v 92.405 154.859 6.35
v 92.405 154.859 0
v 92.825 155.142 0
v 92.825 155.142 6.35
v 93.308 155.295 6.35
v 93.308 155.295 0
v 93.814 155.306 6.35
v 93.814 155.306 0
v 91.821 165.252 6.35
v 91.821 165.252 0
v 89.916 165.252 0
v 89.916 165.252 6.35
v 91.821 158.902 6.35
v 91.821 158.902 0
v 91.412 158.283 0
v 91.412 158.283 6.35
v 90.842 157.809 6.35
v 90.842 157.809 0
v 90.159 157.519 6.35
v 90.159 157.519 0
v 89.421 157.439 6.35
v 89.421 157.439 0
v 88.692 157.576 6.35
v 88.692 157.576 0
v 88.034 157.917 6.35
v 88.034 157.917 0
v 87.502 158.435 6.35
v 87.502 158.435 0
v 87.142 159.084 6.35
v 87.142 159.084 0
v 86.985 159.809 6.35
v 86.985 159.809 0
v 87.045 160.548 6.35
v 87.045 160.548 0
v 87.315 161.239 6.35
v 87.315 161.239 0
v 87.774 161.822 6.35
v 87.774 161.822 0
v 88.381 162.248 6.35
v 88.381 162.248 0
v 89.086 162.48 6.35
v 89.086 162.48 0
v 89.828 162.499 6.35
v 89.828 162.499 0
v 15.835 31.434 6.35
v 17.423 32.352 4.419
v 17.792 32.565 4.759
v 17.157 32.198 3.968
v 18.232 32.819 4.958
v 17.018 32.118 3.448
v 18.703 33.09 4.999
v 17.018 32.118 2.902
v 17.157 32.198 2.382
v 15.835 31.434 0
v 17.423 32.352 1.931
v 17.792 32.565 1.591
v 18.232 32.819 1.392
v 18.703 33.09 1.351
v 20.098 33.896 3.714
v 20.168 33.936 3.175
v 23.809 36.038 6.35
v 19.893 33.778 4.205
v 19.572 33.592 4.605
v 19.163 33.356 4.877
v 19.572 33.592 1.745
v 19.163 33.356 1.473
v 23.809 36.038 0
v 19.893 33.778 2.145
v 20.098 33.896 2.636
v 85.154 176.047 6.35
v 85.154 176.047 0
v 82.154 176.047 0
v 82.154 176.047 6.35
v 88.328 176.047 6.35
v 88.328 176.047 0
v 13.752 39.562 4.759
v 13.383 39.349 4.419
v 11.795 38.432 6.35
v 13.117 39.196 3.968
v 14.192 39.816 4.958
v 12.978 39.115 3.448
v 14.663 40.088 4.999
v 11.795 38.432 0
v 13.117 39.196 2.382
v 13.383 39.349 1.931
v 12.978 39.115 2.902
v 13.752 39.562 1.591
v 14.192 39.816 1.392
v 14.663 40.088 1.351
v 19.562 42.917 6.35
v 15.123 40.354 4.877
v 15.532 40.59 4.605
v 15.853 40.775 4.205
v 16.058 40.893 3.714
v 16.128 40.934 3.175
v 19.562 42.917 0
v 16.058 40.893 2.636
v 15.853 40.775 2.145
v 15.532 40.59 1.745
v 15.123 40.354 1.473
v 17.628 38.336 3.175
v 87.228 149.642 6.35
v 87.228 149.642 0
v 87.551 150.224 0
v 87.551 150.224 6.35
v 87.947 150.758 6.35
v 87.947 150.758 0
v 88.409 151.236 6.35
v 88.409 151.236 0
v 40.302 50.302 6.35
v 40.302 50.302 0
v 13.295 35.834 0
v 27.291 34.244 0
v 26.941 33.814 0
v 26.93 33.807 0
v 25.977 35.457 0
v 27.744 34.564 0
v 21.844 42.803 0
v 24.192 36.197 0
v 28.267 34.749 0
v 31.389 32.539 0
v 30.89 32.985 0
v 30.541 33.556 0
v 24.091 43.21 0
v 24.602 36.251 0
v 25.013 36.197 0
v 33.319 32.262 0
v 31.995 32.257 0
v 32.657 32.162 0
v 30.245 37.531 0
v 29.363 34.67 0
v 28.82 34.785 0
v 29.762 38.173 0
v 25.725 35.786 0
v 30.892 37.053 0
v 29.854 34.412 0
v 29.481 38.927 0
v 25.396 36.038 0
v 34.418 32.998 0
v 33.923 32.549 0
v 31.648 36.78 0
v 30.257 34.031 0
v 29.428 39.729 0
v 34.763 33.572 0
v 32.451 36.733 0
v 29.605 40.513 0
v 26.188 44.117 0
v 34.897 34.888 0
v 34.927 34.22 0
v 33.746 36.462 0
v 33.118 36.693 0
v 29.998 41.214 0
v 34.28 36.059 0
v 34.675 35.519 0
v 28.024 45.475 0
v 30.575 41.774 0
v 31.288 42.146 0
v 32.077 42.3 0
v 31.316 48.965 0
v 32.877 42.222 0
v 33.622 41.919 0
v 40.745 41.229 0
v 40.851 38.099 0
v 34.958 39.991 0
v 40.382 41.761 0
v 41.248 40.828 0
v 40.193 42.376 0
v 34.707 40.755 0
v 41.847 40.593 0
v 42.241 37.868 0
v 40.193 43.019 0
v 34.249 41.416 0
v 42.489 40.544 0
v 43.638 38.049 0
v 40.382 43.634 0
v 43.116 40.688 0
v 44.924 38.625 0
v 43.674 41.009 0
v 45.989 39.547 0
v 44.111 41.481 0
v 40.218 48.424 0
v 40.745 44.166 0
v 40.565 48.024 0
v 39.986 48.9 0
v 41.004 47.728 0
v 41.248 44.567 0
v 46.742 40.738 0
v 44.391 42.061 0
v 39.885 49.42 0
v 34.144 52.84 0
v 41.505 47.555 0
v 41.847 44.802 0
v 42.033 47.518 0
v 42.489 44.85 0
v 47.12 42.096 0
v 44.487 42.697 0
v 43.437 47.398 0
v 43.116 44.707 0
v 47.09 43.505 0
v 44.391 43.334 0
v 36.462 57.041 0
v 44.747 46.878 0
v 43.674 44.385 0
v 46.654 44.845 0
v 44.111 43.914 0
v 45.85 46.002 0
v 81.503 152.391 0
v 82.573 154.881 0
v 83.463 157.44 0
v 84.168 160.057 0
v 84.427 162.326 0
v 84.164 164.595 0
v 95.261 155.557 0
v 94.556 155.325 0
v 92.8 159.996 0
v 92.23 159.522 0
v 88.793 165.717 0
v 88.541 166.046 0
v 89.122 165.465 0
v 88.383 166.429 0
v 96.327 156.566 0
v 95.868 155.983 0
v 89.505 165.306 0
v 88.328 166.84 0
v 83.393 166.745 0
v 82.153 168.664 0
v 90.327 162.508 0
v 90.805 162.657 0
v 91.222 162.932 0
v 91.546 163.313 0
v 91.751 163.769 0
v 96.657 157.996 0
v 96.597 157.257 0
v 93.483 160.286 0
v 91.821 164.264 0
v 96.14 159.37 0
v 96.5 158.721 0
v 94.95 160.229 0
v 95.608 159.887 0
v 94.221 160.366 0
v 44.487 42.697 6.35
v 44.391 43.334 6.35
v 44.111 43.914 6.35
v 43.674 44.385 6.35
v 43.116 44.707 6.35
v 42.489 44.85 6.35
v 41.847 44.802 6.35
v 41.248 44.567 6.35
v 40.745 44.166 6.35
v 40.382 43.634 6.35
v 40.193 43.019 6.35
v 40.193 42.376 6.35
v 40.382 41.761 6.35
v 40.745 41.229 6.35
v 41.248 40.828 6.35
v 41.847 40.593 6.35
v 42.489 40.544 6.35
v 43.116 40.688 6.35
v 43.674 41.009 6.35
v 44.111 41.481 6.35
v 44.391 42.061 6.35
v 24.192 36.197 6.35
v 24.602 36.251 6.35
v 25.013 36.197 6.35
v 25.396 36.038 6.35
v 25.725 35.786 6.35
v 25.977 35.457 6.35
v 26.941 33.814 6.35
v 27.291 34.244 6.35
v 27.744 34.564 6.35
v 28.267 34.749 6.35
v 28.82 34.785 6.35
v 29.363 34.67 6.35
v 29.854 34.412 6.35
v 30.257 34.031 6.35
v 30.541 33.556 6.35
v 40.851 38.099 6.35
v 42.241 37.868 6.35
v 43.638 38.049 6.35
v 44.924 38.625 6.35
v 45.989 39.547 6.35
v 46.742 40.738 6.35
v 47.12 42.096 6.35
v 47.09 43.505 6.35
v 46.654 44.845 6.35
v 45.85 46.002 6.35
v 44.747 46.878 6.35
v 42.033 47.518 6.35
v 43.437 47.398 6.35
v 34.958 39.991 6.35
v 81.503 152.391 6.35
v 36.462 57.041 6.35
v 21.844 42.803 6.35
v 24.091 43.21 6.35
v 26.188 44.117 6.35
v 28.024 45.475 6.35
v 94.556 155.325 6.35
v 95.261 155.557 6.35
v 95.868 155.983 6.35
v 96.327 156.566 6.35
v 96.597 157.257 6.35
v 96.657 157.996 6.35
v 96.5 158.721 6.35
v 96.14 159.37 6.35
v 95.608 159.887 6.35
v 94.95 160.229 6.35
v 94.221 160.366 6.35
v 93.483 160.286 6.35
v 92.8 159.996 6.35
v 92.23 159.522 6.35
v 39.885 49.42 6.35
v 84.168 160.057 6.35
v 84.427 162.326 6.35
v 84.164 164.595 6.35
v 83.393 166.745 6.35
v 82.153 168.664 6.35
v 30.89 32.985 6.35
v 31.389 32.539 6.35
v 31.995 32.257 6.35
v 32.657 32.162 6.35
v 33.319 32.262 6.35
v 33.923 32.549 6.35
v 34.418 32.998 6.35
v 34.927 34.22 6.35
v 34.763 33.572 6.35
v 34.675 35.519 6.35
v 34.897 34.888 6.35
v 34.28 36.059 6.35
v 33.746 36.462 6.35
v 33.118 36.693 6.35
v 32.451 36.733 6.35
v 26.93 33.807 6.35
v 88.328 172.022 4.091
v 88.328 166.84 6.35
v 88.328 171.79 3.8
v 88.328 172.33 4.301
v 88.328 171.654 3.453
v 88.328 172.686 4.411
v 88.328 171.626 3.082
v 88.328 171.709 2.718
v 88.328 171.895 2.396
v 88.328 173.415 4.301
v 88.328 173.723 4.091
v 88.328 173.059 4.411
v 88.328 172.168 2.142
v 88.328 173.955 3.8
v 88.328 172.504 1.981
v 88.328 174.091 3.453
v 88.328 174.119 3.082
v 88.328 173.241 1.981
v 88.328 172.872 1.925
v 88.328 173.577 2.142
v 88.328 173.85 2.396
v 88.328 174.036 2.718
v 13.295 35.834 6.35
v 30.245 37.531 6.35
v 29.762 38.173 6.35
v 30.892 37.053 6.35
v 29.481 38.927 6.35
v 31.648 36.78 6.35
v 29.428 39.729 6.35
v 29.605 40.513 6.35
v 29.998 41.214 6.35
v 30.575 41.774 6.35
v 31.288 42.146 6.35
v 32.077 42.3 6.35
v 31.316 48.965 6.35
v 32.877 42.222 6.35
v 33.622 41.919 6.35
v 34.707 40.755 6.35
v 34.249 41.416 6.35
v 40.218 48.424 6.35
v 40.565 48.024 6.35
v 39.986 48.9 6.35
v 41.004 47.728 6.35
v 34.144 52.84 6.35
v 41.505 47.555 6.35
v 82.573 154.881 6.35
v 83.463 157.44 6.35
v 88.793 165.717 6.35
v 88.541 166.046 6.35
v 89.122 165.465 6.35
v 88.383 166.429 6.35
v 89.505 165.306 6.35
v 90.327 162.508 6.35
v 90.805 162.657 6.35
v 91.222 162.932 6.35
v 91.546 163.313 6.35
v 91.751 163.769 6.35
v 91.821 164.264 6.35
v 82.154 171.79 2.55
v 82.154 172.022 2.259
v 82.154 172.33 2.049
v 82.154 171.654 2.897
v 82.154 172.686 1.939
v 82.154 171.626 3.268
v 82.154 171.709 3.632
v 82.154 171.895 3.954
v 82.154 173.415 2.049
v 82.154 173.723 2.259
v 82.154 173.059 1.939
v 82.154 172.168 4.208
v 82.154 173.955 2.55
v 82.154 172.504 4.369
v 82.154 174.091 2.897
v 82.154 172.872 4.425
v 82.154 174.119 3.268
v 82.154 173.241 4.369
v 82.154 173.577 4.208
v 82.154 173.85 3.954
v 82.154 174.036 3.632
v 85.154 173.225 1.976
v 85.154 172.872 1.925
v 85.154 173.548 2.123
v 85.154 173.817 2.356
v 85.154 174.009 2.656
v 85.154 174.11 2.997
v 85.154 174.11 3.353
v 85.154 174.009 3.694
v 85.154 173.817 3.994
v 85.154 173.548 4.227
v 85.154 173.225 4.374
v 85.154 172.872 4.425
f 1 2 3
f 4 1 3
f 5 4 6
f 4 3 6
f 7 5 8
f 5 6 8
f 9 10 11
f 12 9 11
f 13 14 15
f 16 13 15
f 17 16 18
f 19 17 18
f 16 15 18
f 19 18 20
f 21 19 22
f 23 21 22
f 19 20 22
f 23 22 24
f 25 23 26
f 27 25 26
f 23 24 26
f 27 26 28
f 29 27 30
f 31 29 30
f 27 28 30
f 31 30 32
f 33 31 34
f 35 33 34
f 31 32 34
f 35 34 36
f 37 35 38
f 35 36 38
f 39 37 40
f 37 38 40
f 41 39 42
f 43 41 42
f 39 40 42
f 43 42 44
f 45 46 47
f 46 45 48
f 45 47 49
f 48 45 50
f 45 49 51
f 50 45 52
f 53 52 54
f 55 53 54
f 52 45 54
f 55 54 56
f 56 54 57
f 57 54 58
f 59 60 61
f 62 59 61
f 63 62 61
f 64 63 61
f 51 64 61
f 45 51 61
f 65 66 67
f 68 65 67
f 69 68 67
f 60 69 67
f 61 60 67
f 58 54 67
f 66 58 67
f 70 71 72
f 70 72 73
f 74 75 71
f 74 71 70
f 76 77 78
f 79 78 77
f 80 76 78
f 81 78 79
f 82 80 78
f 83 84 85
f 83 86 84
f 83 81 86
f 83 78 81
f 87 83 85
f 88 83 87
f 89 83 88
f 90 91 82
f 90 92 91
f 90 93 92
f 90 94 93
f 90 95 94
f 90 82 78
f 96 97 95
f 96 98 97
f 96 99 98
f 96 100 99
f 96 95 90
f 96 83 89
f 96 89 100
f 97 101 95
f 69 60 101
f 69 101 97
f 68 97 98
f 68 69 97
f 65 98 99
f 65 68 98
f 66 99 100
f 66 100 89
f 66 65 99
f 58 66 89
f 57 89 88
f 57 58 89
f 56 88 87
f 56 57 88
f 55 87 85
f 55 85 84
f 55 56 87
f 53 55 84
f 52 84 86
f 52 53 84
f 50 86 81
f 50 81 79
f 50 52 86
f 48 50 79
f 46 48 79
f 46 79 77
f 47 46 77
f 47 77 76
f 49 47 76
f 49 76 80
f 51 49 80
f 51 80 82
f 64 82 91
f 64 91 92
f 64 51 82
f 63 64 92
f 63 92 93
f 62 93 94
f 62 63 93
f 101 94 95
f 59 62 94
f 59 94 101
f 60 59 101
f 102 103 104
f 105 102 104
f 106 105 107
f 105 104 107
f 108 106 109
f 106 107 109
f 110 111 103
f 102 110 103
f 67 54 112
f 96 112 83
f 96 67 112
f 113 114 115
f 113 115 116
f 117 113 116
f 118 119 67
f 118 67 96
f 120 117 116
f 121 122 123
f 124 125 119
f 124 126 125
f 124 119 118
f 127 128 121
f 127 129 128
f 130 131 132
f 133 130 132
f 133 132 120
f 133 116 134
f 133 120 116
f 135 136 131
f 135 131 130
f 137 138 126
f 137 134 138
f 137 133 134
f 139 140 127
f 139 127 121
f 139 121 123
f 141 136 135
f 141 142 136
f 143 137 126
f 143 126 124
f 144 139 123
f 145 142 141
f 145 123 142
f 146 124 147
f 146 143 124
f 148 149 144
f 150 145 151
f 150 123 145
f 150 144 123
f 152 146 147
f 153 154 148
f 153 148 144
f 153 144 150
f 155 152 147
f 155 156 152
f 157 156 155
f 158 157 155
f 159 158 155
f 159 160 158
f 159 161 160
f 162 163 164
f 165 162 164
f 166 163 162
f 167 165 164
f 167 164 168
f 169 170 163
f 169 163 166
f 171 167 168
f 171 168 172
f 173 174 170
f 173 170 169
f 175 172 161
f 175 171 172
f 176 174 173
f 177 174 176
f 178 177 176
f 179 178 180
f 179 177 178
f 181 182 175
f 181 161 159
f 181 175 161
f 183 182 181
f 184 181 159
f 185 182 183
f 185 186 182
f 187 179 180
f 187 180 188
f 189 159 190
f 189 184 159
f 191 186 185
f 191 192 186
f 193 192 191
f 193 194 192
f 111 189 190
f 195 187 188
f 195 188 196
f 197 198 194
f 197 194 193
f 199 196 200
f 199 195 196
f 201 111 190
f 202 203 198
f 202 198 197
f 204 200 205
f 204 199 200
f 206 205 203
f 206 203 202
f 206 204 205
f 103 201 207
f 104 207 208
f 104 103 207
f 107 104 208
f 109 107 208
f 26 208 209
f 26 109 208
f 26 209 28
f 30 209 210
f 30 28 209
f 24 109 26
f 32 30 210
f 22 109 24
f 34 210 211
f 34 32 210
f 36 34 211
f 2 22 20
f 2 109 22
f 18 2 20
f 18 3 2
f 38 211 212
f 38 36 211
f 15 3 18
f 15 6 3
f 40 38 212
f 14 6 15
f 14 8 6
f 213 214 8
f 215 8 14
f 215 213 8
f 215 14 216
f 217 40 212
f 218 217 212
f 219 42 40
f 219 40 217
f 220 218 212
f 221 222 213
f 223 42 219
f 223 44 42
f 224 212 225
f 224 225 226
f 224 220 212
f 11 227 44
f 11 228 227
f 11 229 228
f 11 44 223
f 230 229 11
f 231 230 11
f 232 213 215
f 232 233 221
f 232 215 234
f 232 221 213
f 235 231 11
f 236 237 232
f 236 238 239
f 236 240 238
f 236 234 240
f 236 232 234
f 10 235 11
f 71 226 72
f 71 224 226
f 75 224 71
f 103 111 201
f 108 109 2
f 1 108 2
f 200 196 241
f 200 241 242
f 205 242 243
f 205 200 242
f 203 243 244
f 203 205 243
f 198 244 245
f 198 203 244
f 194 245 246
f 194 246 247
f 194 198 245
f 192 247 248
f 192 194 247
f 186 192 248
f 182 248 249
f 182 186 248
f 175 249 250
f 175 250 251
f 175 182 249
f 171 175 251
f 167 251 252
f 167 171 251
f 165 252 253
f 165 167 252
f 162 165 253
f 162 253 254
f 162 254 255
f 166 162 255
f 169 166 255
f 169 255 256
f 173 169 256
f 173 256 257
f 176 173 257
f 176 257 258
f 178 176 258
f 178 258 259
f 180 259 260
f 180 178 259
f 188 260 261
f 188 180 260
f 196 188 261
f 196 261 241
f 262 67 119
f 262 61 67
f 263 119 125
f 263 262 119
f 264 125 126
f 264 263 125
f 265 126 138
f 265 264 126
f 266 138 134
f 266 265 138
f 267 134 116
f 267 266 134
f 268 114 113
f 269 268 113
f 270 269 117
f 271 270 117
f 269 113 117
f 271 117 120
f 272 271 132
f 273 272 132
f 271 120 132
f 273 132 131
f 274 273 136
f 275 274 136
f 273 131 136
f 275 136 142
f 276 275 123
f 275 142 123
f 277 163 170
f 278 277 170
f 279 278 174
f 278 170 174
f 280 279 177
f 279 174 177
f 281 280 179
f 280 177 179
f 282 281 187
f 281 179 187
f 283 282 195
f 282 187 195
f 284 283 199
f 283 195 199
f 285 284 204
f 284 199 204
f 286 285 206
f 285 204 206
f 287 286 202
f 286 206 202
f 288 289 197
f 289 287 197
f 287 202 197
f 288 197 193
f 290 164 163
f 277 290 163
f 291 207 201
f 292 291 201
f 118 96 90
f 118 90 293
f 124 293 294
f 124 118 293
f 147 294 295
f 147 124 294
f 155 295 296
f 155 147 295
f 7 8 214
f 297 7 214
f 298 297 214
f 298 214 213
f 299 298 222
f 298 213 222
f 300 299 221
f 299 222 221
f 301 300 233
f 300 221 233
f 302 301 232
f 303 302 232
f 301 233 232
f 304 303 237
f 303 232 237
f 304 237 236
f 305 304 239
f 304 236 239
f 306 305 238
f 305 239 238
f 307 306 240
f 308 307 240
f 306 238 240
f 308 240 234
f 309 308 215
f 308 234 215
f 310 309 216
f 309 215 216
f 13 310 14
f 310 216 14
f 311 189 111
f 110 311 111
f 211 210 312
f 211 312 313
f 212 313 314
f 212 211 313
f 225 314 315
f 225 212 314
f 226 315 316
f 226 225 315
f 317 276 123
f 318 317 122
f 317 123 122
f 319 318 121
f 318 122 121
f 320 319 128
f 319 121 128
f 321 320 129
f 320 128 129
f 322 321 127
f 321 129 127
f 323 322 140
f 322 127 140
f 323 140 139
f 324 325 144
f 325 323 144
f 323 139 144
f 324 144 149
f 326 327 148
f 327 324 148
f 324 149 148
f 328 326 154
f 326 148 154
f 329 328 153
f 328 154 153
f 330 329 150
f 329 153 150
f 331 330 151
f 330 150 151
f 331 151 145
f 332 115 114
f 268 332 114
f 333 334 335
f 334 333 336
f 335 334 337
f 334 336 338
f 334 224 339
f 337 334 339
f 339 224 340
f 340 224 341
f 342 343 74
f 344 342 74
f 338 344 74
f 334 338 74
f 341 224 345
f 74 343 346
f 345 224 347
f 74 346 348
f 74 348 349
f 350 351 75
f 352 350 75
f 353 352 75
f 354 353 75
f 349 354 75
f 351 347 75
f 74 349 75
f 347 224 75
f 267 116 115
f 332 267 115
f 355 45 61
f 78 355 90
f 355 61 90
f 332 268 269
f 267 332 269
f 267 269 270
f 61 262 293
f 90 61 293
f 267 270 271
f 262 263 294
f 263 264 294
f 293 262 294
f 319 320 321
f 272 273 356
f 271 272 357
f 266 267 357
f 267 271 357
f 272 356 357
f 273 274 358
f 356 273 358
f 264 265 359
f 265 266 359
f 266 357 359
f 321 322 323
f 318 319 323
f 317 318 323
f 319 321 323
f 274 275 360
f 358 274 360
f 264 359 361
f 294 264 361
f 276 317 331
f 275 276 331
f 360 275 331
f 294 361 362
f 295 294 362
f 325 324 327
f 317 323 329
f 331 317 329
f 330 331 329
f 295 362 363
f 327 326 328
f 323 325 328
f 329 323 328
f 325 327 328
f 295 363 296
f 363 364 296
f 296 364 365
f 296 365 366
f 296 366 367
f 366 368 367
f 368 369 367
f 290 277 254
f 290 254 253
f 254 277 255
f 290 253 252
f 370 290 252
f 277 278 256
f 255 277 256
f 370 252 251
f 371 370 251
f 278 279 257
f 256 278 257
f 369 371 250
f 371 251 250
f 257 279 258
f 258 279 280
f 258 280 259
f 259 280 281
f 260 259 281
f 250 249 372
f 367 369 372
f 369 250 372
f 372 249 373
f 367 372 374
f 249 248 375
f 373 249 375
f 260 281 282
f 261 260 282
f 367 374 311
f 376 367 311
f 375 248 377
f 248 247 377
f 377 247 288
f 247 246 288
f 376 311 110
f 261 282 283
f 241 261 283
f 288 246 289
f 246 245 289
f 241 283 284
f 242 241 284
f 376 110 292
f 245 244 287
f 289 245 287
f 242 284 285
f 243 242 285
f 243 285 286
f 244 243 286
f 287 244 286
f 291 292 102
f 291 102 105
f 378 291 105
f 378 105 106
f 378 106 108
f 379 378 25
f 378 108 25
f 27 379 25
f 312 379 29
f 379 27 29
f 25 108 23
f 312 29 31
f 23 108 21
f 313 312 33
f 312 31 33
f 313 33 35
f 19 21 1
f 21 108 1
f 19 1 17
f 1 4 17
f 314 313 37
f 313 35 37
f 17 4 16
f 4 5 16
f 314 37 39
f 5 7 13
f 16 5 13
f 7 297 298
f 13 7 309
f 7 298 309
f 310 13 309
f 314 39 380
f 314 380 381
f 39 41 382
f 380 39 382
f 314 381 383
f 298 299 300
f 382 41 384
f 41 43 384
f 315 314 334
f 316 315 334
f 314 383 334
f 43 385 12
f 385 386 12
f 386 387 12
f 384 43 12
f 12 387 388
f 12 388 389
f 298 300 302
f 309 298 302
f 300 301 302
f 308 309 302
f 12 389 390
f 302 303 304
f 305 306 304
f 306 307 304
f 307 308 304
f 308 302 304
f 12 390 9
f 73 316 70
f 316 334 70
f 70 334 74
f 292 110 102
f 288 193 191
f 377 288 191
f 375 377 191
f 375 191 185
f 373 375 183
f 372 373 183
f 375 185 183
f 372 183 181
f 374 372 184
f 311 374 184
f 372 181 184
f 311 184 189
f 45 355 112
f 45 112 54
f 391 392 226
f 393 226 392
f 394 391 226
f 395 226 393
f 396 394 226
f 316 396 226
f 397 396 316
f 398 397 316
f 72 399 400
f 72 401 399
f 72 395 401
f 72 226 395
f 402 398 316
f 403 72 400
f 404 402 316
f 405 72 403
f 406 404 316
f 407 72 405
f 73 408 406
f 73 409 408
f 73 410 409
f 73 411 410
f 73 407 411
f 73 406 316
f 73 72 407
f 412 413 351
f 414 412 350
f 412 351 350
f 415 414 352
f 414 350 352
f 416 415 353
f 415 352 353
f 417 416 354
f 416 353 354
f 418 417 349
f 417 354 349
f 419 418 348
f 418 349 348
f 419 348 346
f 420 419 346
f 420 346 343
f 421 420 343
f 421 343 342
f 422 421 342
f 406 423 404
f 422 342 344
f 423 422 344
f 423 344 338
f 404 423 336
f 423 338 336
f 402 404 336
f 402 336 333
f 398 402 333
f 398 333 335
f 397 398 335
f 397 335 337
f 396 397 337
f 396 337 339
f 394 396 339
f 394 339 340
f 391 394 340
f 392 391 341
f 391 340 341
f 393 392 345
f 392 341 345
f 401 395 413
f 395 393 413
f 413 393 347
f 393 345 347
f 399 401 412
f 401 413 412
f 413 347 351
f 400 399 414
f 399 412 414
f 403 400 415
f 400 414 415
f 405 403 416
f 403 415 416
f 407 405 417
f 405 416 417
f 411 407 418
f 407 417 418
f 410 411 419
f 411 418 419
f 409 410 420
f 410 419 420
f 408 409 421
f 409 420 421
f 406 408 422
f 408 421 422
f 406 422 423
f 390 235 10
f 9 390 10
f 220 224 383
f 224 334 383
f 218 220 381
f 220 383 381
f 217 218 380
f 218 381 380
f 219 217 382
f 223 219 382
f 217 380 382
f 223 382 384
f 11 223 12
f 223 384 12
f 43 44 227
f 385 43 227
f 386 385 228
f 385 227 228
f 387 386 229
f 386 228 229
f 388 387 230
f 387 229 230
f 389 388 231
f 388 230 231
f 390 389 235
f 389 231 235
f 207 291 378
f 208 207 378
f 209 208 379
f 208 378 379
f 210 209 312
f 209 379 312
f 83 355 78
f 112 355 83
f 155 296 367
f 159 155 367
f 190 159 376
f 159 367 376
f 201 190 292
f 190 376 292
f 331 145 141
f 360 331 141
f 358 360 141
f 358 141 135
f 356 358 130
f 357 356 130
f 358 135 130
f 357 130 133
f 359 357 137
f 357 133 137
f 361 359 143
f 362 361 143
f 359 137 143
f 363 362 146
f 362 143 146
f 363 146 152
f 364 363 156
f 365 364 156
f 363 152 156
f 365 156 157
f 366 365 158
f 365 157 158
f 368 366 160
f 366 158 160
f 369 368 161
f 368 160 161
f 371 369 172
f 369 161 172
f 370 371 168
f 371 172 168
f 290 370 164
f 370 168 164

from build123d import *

# Parameters (mm, degrees)
SKETCH1_R                 = 2.159
BOSS_EXTRUDE1_DEPTH       = 6.35
SKETCH2_R                 = 1.8288
CUT_EXTRUDE1_DEPTH        = 192.647335654
SKETCH3_R                 = 0.635
CUT_EXTRUDE2_DEPTH        = 192.476049021
FILLET1_R                 = 1.5875
FILLET2_R                 = 38.1
M3X0_5_TAPPED_HOLE1_D     = 2.5
M3X0_5_TAPPED_HOLE1_DEPTH = 7.50062
M3X0_5_TAPPED_HOLE1_TIP   = 0.751075774
CORTAR_EXTRUIR1_DEPTH     = 10
CROQUIS8_W                = 8.969129367
CROQUIS8_H                = 6.35
CROQUIS8_R                = 1.8288
SALIENTE_EXTRUIR3_DEPTH   = 3
CROQUIS7_W                = 6.35
CROQUIS7_H                = 7.383174339
CROQUIS7_R                = 1.25
SALIENTE_EXTRUIR4_DEPTH   = 3
REDONDEO1_R               = 10


with BuildPart() as part:
    # Sketch1 → Boss-Extrude1 (new body)
    with BuildSketch(Plane.XY):
        with BuildLine():
            Line((15.834722261, 31.434493723), (25.183466494, 36.831993723))
            Line((25.183466494, 36.831993723), (26.929716494, 33.8074))
            Line((26.929716494, 33.8074), (27.78608986, 34.301827393))
            ThreePointArc((27.78608986, 34.301827393), (29.23868298, 34.44834582), (30.311273673, 33.457869357))
            ThreePointArc((30.311273673, 33.457869357), (34.825897025, 33.143744407), (32.428977808, 36.9824))
            ThreePointArc((32.428977808, 36.9824), (30.032058591, 40.821055593), (34.546681944, 40.506930643))
            ThreePointArc((34.546681944, 40.506930643), (34.984344673, 39.889437479), (35.639187691, 39.509928464))
            Line((35.639187691, 39.509928464), (40.774282272, 37.860721969))
            ThreePointArc((40.774282272, 37.860721969), (47.368100791, 42.064756802), (42.017768622, 47.767939879))
            ThreePointArc((42.017768622, 47.767939879), (40.437125748, 48.5456558), (40.301653082, 50.302050149))
            Line((40.301653082, 50.302050149), (87.227692295, 149.642175178))
            ThreePointArc((87.227692295, 149.642175178), (87.739785188, 150.497310852), (88.408996906, 151.235993347))
            Line((88.408996906, 151.235993347), (92.404798917, 154.858512458))
            ThreePointArc((92.404798917, 154.858512458), (93.060884875, 155.23586864), (93.814481006, 155.3061491))
            ThreePointArc((93.814481006, 155.3061491), (96.343832869, 159.058865136), (91.821, 158.9024))
            ThreePointArc((91.821, 158.9024), (87.298167131, 158.745934864), (89.827518994, 162.4986509))
            ThreePointArc((89.827518994, 162.4986509), (91.22159212, 162.932303457), (91.821, 164.263545213))
            Line((91.821, 164.263545213), (91.821, 165.2524))
            Line((91.821, 165.2524), (88.3285, 165.2524))
            Line((88.3285, 165.2524), (88.3285, 176.0474))
            Line((88.3285, 176.0474), (85.1535, 176.0474))
            Line((85.1535, 176.0474), (85.1535, 160.118189826))
            Line((85.1535, 160.118189826), (31.375529243, 46.272861553))
            Line((31.375529243, 46.272861553), (13.294722261, 35.833902774))
            Line((13.294722261, 35.833902774), (15.834722261, 31.434493723))
        make_face()
        with Locations((42.327648174, 42.6974)):
            Circle(SKETCH1_R, mode=Mode.SUBTRACT)
    extrude(amount=BOSS_EXTRUDE1_DEPTH)

    # Sketch2 → Cut-Extrude1 (cut, through all)
    with BuildSketch(Plane(origin=(-9.652854494, 16.719234422, 0), x_dir=(-0.8660254037844398, -0.49999999999999806, 0), z_dir=(0.499999999999998, -0.8660254037844397, 0))):
        with Locations(Location((-32.605518601, -3.175, 0), (0, 0, 180))):
            Circle(SKETCH2_R)
    extrude(amount=-CUT_EXTRUDE1_DEPTH, mode=Mode.SUBTRACT)

    # Sketch3 → Cut-Extrude2 (cut, through all)
    with BuildSketch(Plane(origin=(88.3285, 0, 0), x_dir=(0, 0, -1), z_dir=(1, 0, 0))):
        with Locations((-3.175, 172.8724)):
            Circle(SKETCH3_R)
    extrude(amount=-CUT_EXTRUDE2_DEPTH, mode=Mode.SUBTRACT)

    # Fillet1
    fillet1_edges = [part.edges().sort_by_distance(p)[0] for p in [
        (88.3285, 165.2524, 3.175),
        (25.183466494, 36.831993723, 3.175),
    ]]
    fillet(fillet1_edges, radius=FILLET1_R)

    # Fillet2
    fillet2_edges = [part.edges().sort_by_distance(p)[0] for p in [
        (31.375529243, 46.272861553, 3.175),
        (85.1535, 160.118189826, 3.175),
    ]]
    fillet(fillet2_edges, radius=FILLET2_R)

    # M3x0.5 Tapped Hole1
    with Locations(Plane.ZY.offset(-85.1535)):
        with Locations((3.175, 172.8724)):
            Hole(M3X0_5_TAPPED_HOLE1_D / 2, depth=M3X0_5_TAPPED_HOLE1_DEPTH)
            with Locations((0, 0, -(M3X0_5_TAPPED_HOLE1_DEPTH + M3X0_5_TAPPED_HOLE1_TIP / 2))):  # 118° drill point
                Cone(0, M3X0_5_TAPPED_HOLE1_D / 2, M3X0_5_TAPPED_HOLE1_TIP, mode=Mode.SUBTRACT)

    # Croquis1 → Cortar-Extruir1 (cut)
    with BuildSketch(Plane(origin=(0, 0, 0), x_dir=(-1, 0, 0), z_dir=(0, 0, -1))):
        with BuildLine():
            ThreePointArc((-42.017768622, 47.767939879), (-47.368100791, 42.064756802), (-40.774282272, 37.860721969))
            Line((-40.774282272, 37.860721969), (-35.639187691, 39.509928464))
            ThreePointArc((-35.639187691, 39.509928464), (-34.984344673, 39.889437479), (-34.546681944, 40.506930643))
            ThreePointArc((-34.546681944, 40.506930643), (-30.032058591, 40.821055593), (-32.428977808, 36.9824))
            ThreePointArc((-32.428977808, 36.9824), (-34.825897025, 33.143744407), (-30.311273673, 33.457869357))
            ThreePointArc((-30.311273673, 33.457869357), (-29.23868298, 34.44834582), (-27.78608986, 34.301827393))
            Line((-27.78608986, 34.301827393), (-26.94132658, 33.814103086))
            ThreePointArc((-26.94132658, 33.814103086), (-28.820278114, 34.784830402), (-30.541333264, 33.555708942))
            ThreePointArc((-30.541333264, 33.555708942), (-34.611603925, 33.272501802), (-32.450601953, 36.733336963))
            ThreePointArc((-32.450601953, 36.733336963), (-29.998259186, 41.214498053), (-34.957952736, 39.991293387))
            Line((-34.957952736, 39.991293387), (-40.850727445, 38.098747463))
            ThreePointArc((-40.850727445, 38.098747463), (-47.12004702, 42.095890817), (-42.0330186, 47.518405436))
            ThreePointArc((-42.0330186, 47.518405436), (-40.565017979, 48.024188561), (-39.885018398, 49.420054945))
            Line((-39.885018398, 49.420054945), (-40.301653082, 50.302050149))
            ThreePointArc((-40.301653082, 50.302050149), (-40.437125748, 48.5456558), (-42.017768622, 47.767939879))
        make_face()
    extrude(amount=-CORTAR_EXTRUIR1_DEPTH, mode=Mode.SUBTRACT)

    # Croquis8 → Saliente-Extruir3 (add)
    with BuildSketch(Plane(origin=(-12.192854494, 21.118643474, 0), x_dir=(0.8660254037844494, 0.4999999999999815, 0), z_dir=(-0.49999999999998146, 0.8660254037844493, 0))):
        with Locations((33.915083284, -3.175)):
            Rectangle(CROQUIS8_W, CROQUIS8_H)
        with Locations((32.605518601, -3.175)):
            Circle(CROQUIS8_R, mode=Mode.SUBTRACT)
    extrude(amount=SALIENTE_EXTRUIR3_DEPTH)

    # Croquis7 → Saliente-Extruir4 (add)
    with BuildSketch(Plane.ZY.offset(-85.1535)):
        with Locations((3.175, 172.355812831)):
            Rectangle(CROQUIS7_W, CROQUIS7_H)
        with Locations((3.175, 172.8724)):
            Circle(CROQUIS7_R, mode=Mode.SUBTRACT)
    extrude(amount=SALIENTE_EXTRUIR4_DEPTH)

    # Redondeo1
    # the kernel refuses this fillet: 10 mm, written as the material it adds along each edge
    with BuildSketch(Plane(origin=(21.062216142, 40.318467458, 0), x_dir=(-0.49999999999998396, 0.8660254037844479, 0), z_dir=(0, 0, 1))) as redondeo1_piece_1:
        with BuildLine():
            CenterArc((10.726495726, -6.348327637), REDONDEO1_R, 140.592418032, 52.464514334)
            Line((0.985035131, -8.607518967), (0.790205919, -8.652702794))
            ThreePointArc((0.790205919, -8.652702794), (0.048356716, -4.354588769), (-0.2, 0))
            Line((-0.2, 0), (0, 0.2))
            ThreePointArc((0, 0.2), (1.5, 0.2), (2.845470085, 0.126966553))
            Line((2.845470085, 0.126966553), (3, 0))
        make_face()
    extrude(amount=6.35)
    with BuildSketch(Plane(origin=(85.1535, 168.664225661, 0), x_dir=(-0.1136968347067967, -0.9935154904568199, 0), z_dir=(0, 0, 1))) as redondeo1_piece_2:
        with BuildLine():
            CenterArc((7.526730458, -9.935154905), REDONDEO1_R, 83.471533817, 52.464514334)
            Line((0.341090504, -2.980546471), (0.197377705, -2.841454303))
            ThreePointArc((0.197377705, -2.841454303), (-0.028157846, -1.513012603), (-0.198703098, -0.022739367))
            Line((-0.198703098, -0.022739367), (-0.022739367, 0.198703098))
            ThreePointArc((-0.022739367, 0.198703098), (4.331849402, 0.447059814), (8.686438172, 0.198703098))
            Line((8.686438172, 0.198703098), (8.663698805, 0))
        make_face()
    extrude(amount=6.35)


solid = part.part
